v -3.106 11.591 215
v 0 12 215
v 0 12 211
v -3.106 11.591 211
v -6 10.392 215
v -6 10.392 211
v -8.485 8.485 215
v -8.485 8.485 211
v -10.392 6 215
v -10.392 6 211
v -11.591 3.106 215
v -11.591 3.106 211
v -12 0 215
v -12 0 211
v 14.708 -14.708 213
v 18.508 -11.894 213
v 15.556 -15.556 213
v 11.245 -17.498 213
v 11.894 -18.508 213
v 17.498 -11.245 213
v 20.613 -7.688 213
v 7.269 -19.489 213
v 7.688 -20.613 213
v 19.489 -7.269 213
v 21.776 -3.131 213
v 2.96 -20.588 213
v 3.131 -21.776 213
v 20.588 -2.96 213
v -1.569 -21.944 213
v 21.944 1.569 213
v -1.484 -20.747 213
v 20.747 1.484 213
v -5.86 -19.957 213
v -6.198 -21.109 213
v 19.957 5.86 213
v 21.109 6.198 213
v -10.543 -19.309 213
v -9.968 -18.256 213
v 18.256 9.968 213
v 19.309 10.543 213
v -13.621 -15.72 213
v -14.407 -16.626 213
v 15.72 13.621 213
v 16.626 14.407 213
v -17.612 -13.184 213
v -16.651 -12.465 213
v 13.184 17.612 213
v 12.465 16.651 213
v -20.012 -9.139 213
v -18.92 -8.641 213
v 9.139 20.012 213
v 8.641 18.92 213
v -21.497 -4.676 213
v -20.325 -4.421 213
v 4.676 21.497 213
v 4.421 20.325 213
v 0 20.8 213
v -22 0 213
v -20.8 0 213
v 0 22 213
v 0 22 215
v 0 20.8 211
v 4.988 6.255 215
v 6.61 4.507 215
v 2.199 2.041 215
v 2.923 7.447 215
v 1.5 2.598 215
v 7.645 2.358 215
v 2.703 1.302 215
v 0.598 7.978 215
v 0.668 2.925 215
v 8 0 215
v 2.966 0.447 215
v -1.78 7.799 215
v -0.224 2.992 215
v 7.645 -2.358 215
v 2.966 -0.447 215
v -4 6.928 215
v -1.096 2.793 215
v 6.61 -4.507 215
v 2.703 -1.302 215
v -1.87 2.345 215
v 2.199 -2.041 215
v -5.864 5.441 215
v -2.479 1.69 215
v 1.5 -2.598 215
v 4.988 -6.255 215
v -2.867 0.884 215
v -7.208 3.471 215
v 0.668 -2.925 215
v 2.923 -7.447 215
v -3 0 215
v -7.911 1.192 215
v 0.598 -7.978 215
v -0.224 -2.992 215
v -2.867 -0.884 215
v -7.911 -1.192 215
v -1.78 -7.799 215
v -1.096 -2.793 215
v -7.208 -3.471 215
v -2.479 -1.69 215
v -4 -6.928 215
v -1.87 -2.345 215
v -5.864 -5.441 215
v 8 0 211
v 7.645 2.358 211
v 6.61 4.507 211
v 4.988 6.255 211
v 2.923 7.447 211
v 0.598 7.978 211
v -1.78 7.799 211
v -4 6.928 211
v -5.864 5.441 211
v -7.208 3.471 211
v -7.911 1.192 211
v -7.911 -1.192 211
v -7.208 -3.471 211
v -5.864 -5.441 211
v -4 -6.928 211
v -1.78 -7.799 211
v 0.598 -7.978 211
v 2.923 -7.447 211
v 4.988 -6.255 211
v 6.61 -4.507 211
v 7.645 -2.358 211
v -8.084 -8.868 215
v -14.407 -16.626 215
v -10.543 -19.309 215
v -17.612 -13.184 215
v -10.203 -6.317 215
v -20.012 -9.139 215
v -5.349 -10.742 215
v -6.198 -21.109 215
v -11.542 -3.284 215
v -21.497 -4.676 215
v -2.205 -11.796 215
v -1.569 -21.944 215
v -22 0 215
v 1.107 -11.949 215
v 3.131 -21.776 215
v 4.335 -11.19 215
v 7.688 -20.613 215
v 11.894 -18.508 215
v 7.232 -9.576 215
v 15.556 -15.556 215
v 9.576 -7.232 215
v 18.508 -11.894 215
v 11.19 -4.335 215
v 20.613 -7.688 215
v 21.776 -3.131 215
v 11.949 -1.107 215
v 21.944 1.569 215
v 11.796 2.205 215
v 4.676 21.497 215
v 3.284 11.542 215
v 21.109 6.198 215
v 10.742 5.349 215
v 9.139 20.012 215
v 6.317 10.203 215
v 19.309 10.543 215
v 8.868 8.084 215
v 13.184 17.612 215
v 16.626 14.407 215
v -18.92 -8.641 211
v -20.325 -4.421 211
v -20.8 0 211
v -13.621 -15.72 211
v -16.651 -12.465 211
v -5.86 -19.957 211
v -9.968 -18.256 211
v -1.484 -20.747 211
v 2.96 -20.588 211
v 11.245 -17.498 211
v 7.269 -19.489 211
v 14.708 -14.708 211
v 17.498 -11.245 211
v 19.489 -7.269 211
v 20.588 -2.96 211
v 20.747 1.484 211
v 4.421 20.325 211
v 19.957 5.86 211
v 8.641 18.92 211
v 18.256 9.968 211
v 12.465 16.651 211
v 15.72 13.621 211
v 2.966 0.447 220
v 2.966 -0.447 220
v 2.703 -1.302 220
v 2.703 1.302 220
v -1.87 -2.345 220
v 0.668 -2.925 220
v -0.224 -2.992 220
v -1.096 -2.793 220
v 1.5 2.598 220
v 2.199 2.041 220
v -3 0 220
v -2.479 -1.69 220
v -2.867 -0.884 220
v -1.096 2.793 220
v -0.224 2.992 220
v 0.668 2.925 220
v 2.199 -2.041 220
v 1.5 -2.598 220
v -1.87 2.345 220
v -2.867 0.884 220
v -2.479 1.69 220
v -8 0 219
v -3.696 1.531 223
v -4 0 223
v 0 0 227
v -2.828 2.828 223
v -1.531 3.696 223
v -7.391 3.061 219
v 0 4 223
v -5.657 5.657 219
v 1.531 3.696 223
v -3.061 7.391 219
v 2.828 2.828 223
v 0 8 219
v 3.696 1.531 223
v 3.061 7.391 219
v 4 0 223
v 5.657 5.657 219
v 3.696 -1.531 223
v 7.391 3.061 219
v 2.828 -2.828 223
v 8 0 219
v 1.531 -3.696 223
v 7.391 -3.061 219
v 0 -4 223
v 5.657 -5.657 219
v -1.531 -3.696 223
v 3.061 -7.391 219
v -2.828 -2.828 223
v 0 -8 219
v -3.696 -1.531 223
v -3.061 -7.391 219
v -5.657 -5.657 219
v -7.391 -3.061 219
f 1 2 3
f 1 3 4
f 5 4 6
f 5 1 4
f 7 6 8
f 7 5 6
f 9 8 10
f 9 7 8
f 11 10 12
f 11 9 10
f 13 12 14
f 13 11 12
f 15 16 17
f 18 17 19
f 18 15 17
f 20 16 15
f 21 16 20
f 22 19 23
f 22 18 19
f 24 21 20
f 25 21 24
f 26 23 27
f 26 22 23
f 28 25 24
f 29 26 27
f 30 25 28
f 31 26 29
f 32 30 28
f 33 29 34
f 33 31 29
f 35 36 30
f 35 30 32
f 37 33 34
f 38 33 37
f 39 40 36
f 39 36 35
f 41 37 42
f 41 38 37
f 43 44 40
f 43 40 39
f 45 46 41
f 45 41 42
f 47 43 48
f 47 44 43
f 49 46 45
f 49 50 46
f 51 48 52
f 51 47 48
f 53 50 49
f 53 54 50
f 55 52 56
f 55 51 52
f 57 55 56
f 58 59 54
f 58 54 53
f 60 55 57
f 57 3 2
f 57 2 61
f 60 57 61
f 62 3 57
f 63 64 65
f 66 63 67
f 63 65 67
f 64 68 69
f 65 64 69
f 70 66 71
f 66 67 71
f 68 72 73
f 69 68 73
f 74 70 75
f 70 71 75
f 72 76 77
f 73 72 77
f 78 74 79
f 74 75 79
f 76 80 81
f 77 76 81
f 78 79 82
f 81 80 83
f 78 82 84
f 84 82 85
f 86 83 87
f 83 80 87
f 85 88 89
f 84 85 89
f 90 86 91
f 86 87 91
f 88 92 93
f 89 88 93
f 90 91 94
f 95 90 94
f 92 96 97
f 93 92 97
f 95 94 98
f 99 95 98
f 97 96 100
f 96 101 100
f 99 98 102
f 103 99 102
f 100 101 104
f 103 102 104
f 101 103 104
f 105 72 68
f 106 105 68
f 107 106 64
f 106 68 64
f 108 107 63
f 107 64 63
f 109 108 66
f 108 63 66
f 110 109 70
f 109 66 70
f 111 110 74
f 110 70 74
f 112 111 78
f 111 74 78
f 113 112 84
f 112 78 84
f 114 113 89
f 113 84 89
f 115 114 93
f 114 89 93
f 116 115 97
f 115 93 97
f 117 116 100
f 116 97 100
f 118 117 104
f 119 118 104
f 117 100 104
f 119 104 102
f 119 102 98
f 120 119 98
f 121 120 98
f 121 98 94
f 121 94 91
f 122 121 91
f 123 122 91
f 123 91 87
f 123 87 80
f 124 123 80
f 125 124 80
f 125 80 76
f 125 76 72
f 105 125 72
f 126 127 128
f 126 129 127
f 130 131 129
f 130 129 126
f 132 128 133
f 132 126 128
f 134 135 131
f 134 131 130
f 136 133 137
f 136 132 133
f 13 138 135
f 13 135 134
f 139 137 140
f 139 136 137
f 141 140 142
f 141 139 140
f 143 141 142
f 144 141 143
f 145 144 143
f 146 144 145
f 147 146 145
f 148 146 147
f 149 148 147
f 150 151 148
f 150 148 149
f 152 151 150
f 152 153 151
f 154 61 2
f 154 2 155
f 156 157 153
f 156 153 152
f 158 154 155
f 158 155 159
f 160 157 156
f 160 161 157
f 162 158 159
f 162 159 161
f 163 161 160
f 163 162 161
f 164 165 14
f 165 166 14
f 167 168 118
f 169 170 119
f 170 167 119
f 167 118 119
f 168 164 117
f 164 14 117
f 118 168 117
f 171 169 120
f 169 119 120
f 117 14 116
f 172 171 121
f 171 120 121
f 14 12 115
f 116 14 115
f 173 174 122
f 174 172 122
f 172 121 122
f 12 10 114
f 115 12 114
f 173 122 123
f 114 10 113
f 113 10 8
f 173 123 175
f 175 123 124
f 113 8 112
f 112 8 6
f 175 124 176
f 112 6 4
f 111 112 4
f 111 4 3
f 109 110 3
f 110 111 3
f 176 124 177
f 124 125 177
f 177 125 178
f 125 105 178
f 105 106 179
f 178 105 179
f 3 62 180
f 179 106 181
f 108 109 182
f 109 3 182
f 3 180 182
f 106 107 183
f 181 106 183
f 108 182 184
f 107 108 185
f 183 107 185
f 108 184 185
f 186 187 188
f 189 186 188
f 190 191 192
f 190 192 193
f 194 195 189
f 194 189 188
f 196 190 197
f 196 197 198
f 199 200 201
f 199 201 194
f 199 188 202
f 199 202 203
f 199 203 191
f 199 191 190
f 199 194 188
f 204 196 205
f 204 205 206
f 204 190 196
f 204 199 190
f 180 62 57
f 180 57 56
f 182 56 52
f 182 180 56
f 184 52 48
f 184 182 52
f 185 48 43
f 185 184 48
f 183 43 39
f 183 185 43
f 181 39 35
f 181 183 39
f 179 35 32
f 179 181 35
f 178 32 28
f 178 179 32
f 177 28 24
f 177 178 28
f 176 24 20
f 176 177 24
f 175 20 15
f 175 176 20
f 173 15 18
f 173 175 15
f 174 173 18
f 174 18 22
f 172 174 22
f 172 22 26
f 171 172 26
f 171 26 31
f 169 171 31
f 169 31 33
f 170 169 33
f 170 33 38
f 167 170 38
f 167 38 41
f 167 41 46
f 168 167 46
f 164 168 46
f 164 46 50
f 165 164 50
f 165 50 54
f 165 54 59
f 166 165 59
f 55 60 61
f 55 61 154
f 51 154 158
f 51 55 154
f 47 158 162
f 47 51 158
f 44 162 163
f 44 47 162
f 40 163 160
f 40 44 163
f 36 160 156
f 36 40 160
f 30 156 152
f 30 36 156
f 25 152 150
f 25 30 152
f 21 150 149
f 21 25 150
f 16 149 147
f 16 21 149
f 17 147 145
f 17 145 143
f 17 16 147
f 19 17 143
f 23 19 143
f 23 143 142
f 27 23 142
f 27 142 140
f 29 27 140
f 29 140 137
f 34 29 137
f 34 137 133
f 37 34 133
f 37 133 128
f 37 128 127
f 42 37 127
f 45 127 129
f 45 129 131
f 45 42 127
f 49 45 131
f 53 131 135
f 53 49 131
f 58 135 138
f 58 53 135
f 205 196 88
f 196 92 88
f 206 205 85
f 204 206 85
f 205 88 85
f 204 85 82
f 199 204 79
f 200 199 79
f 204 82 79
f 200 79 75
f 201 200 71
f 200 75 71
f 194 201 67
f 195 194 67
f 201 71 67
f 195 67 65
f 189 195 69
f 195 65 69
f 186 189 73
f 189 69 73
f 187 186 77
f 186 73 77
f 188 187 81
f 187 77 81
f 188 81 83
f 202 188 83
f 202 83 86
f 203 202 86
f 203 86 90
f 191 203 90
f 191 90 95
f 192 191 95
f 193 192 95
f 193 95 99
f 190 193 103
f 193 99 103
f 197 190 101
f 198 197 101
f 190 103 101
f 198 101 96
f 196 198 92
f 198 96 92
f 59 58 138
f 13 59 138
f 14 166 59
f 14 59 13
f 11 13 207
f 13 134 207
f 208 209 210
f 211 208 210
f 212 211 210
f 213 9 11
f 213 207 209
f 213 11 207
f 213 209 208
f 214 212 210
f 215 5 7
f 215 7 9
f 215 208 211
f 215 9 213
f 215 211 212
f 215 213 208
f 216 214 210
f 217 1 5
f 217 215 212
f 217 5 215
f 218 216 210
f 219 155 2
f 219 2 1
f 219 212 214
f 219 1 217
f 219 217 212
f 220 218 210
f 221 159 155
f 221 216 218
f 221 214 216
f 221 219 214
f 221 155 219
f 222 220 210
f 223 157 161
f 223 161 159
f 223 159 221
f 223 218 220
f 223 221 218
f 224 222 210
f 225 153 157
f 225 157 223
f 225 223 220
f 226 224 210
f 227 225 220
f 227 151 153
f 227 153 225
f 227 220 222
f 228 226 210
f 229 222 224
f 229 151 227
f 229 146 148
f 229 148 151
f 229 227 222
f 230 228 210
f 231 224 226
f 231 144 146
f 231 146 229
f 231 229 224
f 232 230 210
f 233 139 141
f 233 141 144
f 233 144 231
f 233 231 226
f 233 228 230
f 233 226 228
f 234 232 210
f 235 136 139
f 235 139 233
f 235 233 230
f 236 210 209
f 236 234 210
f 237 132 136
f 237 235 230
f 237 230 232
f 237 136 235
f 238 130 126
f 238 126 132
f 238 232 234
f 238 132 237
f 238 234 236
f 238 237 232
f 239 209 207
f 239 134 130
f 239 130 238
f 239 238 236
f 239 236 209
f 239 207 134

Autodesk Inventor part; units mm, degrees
ref_plane "YZ Plane" through (0, 0, 0) normal (1, 0, 0) x (0, 1, 0)
ref_plane "XZ Plane" through (0, 0, 0) normal (0, 1, 0) x (-1, 0, 0)
ref_plane "XY Plane" through (0, 0, 0) normal (0, 0, 1) x (1, 0, 0)
sketch "Эскиз1" plane through (0, 0, 0) normal (0, 0, 1) x (1, 0, 0)
  circle A0 centre (0, 0) radius 7.5
  circle A1 centre (0, 0) radius 20
  circle A2 centre (0, 0) radius 22
  line L0 (0, 0) -> (-22, 0)
  line L1 (0, 0) -> (0, 22)
  line L2 (-22, 0) -> (-20, 0)
  line L3 (-20, 0) -> (-20, -4)
  line L4 (-20, -4) -> (-22, -4)
  line L5 (-22, -4) -> (-22, 0)
  point P0 (20, 0)
  point P1 (22, 0)
  point P2 (0, 20)
  point P3 (-20, 0)
  point P4 (-21.6333, -4)
  dimension "d1" = 40
  dimension "d0" = 15
  dimension "d2" = 2
  dimension "d10" = 4
extrude "Выдавливание1" add sketch "Эскиз1" along normal blind 215 contours L1 A2 L4 L3 A1 | L3 L4 A2 L0
sketch "Эскиз2" plane through (0, 0, 215) normal (0, 0, 1) x (1, 0, 0)
  arc A0 (-20, 0) -> (0, 20) centre (0, 0) ccw projected
  arc A1 (-22, 0) -> (0, 22) centre (0, 0) ccw projected
  arc A2 (-22, 0) -> (0, 22) centre (0, 0) ccw projected
  line L0 (0, 22) -> (0, 20) projected
  arc A3 (-20, 0) -> (0, 20) centre (0, 0) ccw projected
  line L1 (-20, 0) -> (-22, 0) projected
  circle A4 centre (0, 0) radius 8
  line L2 (0, 8) -> (0, 20)
  line L3 (-8, 0) -> (-20.5, 0)
  circle A5 centre (0, 0) radius 12
  point P0 (0, 20)
  point P1 (-12, 0)
  point P2 (0, 12)
  dimension "d5" = 16
  dimension "d15" = 4
extrude "Выдавливание2" add sketch "Эскиз2" against normal blind 4 contours L3 A5 L2 A0 | A5 L2 A4 L3 | L3 A4 L2 A5
sketch "Эскиз3" plane through (0, 0, 0) normal (0, 0, -1) x (-1, 0, 0)
  line L0 (20, 0) -> (12, 0) projected
  circle A0 centre (0, 0) radius 8 projected
  line L1 (0, 12) -> (0, 20) projected
  arc A1 (0, 20) -> (20, 0) centre (0, 0) ccw projected
  arc A2 (12, 0) -> (0, 12) centre (0, 0) ccw projected
extrude "Выдавливание3" add sketch "Эскиз3" against normal blind 4
sketch "Эскиз4" plane through (0, 0, 0) normal (0, 0, -1) x (-1, 0, 0)
  arc A0 (0, 20) -> (20, 0) centre (0, 0) ccw projected
  line L0 (20, 0) -> (60, 0)
  line L1 (60, 0) -> (60, -4)
  line L2 (60, -4) -> (20, -4)
  line L3 (20, -4) -> (20, 0)
  dimension "d11" = 40
  dimension "d12" = 4
extrude "Выдавливание4" add sketch "Эскиз4" against normal blind 60
sketch "Эскиз5" plane through (-60, -4, 0) normal (0, -1, 0) x (1, 0, 0)
  line L0 (10, 50) -> (25, 50)
  line L1 (25, 50) -> (25, 45)
  line L2 (25, 45) -> (10, 45)
  line L3 (10, 45) -> (10, 50)
  line L4 (10, 15) -> (25, 15)
  line L5 (25, 15) -> (25, 10)
  line L6 (25, 10) -> (10, 10)
  line L7 (10, 10) -> (10, 15)
  line L8 (38.3667, 0) -> (0, 0) projected
  line L9 (0, 0) -> (0, 60) projected
  line L10 (0, 30) -> (39.4889, 30)
  line L11 (38.3667, 60) -> (38.3667, 0) projected
  line L12 (10, 27.5) -> (25, 27.5)
  line L13 (25, 27.5) -> (25, 32.5)
  line L14 (25, 32.5) -> (10, 32.5)
  line L15 (10, 32.5) -> (10, 27.5)
  point P0 (60, 0)
  dimension "d16" = 10
  dimension "d17" = 10
  dimension "d19" = 5
  dimension "d22" = 15
  dimension "d23" = 0
extrude "Выдавливание5" cut sketch "Эскиз5" against normal blind 10 contours L0 L1 L2 L3 | L4 L5 L6 L7 | L13 L12 L15 L10 | L10 L15 L14 L13
sketch "Эскиз6" plane through (-60, -4, 0) normal (-1, 0, 0) x (0, 0, 1)
  line L0 (211, 32.0308) -> (-1.8272, 32.0308)
  line L1 (-1.8272, 32.0308) -> (-1.8272, -28.2031)
  line L2 (-1.8272, -28.2031) -> (211, -28.2031)
  line L3 (211, -28.2031) -> (211, 32.0308)
  point P0 (0, 4)
extrude "Выдавливание6" cut sketch "Эскиз6" against normal blind 100
sketch "Эскиз7" plane through (0, 0, 211) normal (0, 0, -1) x (-1, 0, 0)
  arc A0 (0, 22) -> (22, 0) centre (0, 0) ccw projected
  circle A1 centre (0, 0) radius 22
  circle A2 centre (0, 0) radius 20.8
  point P0 (0, 20.8)
  point P1 (22, 0)
  dimension "d26" = 1.2
extrude "Выдавливание7" cut sketch "Эскиз7" against normal blind 2
sketch "Эскиз9" plane through (0, 0, 0) normal (0, 1, 0) x (-1, 0, 0)
  line L0 (12, 215) -> (0, 215) projected
  circle A0 centre (0, 215) radius 12
  line L1 (0, 215) -> (0, 227)
  line L2 (12, 215) -> (0, 227)
  point P0 (0, 0)
revolve "Вращение1" add sketch "Эскиз9" angle 360 about axis through (0, 0, 215) along (0, 0, 1) contours L0 L1 L2
sketch "Эскиз10" plane through (0, 0, 215) normal (0, 0, -1) x (-1, 0, 0)
  circle A0 centre (0, 0) radius 3
  dimension "d30" = 6
extrude "Выдавливание8" cut sketch "Эскиз10" against normal blind 5
properties part number "крышка кожуха пушки"
